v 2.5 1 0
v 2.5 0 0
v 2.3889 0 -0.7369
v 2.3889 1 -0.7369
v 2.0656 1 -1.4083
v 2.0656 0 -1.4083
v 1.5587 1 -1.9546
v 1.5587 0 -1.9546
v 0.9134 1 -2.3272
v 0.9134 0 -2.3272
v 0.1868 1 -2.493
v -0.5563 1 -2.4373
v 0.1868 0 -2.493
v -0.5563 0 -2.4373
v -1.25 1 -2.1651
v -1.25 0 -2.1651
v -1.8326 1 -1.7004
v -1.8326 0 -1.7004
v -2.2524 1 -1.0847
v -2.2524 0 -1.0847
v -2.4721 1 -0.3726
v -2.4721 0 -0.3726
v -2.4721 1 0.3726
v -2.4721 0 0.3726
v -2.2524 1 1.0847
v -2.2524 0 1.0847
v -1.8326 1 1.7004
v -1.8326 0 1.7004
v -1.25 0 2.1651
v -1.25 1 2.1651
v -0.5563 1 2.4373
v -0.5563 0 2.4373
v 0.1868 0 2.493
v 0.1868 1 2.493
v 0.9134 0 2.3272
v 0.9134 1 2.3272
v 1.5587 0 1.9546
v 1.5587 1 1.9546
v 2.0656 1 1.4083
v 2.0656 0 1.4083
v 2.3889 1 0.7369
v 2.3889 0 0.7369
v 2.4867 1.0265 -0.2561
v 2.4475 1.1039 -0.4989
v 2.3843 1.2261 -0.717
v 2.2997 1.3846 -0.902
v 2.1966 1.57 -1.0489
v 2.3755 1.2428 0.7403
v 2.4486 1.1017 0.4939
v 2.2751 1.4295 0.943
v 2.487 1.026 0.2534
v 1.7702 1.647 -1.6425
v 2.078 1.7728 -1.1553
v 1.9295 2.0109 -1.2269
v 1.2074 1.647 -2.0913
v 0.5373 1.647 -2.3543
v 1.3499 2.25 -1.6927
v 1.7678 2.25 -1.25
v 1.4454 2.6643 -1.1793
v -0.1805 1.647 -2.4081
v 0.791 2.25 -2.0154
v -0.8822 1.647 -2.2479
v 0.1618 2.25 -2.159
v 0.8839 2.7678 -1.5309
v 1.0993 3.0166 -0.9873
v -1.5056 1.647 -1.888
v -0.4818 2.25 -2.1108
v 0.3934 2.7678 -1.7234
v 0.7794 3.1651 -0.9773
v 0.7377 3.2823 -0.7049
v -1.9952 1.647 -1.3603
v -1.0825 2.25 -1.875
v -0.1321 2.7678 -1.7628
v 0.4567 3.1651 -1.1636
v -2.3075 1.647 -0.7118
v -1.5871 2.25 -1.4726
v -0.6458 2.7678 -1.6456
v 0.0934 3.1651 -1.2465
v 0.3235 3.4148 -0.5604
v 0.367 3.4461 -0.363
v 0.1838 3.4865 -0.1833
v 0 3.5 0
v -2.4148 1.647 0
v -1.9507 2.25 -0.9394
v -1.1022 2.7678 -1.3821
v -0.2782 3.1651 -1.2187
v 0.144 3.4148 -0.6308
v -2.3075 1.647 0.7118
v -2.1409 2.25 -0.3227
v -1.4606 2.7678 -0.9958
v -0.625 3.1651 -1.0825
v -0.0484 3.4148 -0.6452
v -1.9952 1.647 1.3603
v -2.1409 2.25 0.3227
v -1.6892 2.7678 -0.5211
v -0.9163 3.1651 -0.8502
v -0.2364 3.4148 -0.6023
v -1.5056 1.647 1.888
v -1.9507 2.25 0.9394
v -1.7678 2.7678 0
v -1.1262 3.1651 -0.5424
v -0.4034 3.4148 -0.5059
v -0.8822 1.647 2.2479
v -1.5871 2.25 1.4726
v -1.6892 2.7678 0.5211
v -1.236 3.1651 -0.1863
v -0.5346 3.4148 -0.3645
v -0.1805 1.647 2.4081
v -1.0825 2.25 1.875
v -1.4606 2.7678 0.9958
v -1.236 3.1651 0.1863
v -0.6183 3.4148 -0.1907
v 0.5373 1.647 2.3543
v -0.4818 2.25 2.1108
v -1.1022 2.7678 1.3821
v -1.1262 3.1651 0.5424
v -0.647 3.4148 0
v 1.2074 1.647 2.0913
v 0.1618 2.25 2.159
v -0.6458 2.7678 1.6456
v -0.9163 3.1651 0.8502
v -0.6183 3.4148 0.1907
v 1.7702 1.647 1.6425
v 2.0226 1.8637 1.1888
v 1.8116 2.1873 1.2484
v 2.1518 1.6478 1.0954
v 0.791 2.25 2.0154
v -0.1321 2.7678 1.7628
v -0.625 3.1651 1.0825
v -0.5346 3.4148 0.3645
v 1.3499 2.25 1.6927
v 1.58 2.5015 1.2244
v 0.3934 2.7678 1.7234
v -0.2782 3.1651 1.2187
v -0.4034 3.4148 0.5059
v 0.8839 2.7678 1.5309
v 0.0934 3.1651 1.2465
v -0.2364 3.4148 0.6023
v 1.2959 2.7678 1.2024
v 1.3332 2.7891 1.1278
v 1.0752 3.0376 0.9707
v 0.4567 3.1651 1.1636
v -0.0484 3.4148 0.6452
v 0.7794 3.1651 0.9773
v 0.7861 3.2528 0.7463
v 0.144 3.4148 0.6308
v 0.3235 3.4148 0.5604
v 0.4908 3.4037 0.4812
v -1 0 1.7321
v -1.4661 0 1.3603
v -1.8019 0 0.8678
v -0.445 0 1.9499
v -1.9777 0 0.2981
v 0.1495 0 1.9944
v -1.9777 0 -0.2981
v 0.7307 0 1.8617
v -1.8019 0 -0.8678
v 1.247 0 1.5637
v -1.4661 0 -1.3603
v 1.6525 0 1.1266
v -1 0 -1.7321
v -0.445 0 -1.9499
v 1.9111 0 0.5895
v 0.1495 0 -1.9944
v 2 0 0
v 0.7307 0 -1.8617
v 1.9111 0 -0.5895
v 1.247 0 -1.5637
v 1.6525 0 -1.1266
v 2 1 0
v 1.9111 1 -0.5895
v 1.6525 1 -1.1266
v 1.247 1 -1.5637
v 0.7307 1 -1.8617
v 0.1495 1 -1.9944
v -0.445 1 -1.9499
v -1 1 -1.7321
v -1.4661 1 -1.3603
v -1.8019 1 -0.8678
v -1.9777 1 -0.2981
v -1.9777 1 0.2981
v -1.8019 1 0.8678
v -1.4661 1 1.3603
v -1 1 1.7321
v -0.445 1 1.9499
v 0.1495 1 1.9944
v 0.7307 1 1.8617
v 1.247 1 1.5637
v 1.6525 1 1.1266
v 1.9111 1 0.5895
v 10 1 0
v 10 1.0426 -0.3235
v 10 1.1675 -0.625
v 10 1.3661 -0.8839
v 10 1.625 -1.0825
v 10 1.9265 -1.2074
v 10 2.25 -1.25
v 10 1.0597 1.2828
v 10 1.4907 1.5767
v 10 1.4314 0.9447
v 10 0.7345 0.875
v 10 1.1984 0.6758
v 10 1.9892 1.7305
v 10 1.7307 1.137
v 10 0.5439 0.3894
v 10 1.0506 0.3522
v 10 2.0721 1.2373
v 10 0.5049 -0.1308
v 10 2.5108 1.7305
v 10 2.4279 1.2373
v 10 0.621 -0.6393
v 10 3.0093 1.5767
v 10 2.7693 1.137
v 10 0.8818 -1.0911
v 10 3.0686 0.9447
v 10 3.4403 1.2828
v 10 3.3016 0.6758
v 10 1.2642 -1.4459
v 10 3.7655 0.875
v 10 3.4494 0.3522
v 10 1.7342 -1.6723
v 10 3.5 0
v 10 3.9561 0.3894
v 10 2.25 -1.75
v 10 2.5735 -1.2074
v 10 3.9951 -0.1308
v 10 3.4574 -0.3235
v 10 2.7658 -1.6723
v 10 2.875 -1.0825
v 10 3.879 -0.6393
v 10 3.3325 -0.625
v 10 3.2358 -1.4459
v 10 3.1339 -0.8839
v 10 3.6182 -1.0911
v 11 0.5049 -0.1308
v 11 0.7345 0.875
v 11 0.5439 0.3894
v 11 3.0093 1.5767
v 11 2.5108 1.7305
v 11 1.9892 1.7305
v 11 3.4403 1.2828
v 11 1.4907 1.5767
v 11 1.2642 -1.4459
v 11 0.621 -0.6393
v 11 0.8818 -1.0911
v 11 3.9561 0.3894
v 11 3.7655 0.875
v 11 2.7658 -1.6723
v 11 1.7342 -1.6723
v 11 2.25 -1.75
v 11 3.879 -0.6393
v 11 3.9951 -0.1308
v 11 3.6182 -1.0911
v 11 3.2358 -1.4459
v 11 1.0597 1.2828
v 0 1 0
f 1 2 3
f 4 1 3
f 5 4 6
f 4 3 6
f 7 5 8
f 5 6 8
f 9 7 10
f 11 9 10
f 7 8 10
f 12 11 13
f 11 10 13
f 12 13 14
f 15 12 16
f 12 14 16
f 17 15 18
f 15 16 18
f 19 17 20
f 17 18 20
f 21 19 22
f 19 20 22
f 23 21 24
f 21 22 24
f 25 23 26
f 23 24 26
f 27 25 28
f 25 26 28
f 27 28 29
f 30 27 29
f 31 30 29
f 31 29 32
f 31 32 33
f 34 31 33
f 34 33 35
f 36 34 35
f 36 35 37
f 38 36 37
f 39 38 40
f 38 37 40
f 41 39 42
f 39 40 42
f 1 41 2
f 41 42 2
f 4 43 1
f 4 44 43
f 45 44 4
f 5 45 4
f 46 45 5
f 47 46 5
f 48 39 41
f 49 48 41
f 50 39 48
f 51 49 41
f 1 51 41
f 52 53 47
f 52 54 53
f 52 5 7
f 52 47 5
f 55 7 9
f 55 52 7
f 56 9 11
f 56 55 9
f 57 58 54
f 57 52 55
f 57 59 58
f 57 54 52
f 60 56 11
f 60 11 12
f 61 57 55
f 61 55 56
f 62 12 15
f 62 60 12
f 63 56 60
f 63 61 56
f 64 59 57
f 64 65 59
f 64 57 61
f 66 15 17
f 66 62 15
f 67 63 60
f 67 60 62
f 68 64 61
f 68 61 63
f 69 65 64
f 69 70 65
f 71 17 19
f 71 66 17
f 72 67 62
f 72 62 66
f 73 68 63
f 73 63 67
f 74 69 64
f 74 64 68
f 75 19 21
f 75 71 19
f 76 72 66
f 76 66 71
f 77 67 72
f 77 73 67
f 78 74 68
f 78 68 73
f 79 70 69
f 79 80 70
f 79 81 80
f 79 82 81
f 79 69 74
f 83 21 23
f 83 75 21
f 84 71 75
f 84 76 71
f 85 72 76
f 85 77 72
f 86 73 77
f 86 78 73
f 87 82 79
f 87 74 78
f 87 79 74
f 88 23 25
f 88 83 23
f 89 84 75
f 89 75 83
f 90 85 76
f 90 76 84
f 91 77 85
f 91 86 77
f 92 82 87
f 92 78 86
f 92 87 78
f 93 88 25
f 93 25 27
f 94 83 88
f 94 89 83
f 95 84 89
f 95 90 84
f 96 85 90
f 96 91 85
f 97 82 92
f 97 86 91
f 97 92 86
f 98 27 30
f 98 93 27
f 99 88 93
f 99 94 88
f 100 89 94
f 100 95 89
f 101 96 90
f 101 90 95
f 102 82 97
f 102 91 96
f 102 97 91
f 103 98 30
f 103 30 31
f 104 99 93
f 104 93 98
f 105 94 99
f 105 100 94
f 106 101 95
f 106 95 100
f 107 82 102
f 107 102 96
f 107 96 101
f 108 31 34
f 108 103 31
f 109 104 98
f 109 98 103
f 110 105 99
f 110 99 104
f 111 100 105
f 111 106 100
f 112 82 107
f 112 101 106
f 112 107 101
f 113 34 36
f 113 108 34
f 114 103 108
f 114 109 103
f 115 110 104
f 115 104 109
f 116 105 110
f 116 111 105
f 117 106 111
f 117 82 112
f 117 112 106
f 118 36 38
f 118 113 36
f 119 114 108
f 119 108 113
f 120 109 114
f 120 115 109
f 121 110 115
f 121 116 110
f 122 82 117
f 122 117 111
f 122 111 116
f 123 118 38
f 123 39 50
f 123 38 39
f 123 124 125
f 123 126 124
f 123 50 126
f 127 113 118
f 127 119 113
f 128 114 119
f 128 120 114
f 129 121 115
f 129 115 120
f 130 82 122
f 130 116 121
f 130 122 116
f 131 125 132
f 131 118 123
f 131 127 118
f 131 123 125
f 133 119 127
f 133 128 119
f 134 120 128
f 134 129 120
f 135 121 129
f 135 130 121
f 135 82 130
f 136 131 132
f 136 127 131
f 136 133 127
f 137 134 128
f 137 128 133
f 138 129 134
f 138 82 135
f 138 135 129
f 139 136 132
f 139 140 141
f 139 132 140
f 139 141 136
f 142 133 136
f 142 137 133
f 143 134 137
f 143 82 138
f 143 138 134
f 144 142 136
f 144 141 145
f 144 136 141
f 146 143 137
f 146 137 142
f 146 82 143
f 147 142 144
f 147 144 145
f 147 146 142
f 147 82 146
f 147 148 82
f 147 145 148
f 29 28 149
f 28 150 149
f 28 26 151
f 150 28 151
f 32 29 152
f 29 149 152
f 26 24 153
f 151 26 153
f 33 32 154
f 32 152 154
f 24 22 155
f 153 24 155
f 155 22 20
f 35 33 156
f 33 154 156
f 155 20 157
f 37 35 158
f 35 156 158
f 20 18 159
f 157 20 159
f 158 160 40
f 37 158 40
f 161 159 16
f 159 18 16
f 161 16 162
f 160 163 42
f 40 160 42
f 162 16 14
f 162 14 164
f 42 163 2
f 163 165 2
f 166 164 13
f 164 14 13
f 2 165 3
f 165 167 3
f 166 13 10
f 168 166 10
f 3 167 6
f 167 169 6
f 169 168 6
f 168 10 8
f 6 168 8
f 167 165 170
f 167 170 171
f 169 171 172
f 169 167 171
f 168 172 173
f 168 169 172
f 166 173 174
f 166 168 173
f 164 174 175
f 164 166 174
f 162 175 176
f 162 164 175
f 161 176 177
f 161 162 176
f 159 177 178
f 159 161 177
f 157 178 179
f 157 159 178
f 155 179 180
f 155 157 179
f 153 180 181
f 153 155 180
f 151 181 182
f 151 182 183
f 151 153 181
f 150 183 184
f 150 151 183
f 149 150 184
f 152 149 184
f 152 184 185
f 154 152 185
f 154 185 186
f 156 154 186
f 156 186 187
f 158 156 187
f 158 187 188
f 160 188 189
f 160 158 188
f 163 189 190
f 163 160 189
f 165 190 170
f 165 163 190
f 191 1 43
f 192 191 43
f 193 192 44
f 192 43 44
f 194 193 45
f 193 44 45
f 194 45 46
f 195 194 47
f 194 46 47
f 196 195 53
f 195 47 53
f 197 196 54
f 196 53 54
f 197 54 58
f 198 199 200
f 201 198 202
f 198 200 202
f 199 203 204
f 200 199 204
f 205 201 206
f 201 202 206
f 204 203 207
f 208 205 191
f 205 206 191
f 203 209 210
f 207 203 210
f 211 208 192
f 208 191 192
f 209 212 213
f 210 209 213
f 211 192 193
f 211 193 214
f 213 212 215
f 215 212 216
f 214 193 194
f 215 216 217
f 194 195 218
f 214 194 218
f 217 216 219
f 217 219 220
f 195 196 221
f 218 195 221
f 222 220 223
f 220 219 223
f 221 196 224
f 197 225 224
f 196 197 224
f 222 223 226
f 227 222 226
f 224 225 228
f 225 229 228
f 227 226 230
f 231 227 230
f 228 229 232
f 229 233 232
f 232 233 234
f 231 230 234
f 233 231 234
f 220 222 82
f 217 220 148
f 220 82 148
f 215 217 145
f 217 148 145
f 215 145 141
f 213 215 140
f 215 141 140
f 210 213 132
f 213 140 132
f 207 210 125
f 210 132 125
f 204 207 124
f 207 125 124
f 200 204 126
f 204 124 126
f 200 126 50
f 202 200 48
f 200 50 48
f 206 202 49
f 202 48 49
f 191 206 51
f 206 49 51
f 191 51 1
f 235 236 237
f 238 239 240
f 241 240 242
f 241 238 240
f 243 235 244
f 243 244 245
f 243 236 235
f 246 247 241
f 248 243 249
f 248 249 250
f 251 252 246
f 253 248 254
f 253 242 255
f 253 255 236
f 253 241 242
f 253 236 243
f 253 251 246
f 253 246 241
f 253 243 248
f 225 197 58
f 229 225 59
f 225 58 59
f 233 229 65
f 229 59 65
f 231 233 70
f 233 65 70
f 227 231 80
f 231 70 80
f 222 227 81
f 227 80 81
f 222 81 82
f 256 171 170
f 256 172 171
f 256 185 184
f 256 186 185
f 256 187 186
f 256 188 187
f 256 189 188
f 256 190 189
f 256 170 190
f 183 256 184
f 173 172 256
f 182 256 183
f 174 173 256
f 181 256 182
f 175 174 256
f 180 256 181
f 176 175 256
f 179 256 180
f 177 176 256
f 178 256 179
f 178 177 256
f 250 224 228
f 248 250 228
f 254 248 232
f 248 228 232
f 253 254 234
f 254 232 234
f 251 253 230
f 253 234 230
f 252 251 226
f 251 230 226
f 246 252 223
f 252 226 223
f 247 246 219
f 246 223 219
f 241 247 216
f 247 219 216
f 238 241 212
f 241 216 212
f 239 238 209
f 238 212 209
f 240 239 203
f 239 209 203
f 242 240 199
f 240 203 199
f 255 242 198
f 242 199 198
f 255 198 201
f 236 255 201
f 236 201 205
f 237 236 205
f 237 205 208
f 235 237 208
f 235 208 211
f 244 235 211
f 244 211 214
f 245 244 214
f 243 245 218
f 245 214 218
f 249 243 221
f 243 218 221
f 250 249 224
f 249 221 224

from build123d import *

# Parameters (mm, degrees)
SKETCH_1_R      = 2.5
SKETCH_1_R_2    = 2
EXTRUDE_1_DEPTH = 1
SKETCH_3_R      = 1.25
EXTRUDE_2_DEPTH = 10
SKETCH_4_R      = 1.75
EXTRUDE_3_DEPTH = 1


with BuildPart() as part:
    # 草图1 → 凸台-拉伸1 (new body)
    with BuildSketch(Plane(origin=(0, 0, 0), x_dir=(1, 0, 0), z_dir=(0, 1, 0))):
        Circle(SKETCH_1_R)
        Circle(SKETCH_1_R_2, mode=Mode.SUBTRACT)
    extrude(amount=EXTRUDE_1_DEPTH)

    # 草图2 → 旋转1 (revolve)
    with BuildSketch(Plane.XY):
        with BuildLine():
            Line((0, 3.5), (0, 1))
            Line((0, 1), (2.5, 1))
            ThreePointArc((2.5, 1), (1.767766953, 2.767766953), (0, 3.5))
        make_face()
    revolve(axis=Axis((0, 1, 0), (0, 1, 0)))

    # 草图3 → 凸台-拉伸2 (add)
    with BuildSketch(Plane(origin=(0, 0, 0), x_dir=(0, 0, -1), z_dir=(1, 0, 0))):
        with Locations((0, 2.25)):
            Circle(SKETCH_3_R)
    extrude(amount=EXTRUDE_2_DEPTH)

    # 草图4 → 凸台-拉伸3 (add)
    with BuildSketch(Plane(origin=(10, 0, 0), x_dir=(0, 0, -1), z_dir=(1, 0, 0))):
        with Locations((0, 2.25)):
            Circle(SKETCH_4_R)
    extrude(amount=EXTRUDE_3_DEPTH)


solid = part.part
